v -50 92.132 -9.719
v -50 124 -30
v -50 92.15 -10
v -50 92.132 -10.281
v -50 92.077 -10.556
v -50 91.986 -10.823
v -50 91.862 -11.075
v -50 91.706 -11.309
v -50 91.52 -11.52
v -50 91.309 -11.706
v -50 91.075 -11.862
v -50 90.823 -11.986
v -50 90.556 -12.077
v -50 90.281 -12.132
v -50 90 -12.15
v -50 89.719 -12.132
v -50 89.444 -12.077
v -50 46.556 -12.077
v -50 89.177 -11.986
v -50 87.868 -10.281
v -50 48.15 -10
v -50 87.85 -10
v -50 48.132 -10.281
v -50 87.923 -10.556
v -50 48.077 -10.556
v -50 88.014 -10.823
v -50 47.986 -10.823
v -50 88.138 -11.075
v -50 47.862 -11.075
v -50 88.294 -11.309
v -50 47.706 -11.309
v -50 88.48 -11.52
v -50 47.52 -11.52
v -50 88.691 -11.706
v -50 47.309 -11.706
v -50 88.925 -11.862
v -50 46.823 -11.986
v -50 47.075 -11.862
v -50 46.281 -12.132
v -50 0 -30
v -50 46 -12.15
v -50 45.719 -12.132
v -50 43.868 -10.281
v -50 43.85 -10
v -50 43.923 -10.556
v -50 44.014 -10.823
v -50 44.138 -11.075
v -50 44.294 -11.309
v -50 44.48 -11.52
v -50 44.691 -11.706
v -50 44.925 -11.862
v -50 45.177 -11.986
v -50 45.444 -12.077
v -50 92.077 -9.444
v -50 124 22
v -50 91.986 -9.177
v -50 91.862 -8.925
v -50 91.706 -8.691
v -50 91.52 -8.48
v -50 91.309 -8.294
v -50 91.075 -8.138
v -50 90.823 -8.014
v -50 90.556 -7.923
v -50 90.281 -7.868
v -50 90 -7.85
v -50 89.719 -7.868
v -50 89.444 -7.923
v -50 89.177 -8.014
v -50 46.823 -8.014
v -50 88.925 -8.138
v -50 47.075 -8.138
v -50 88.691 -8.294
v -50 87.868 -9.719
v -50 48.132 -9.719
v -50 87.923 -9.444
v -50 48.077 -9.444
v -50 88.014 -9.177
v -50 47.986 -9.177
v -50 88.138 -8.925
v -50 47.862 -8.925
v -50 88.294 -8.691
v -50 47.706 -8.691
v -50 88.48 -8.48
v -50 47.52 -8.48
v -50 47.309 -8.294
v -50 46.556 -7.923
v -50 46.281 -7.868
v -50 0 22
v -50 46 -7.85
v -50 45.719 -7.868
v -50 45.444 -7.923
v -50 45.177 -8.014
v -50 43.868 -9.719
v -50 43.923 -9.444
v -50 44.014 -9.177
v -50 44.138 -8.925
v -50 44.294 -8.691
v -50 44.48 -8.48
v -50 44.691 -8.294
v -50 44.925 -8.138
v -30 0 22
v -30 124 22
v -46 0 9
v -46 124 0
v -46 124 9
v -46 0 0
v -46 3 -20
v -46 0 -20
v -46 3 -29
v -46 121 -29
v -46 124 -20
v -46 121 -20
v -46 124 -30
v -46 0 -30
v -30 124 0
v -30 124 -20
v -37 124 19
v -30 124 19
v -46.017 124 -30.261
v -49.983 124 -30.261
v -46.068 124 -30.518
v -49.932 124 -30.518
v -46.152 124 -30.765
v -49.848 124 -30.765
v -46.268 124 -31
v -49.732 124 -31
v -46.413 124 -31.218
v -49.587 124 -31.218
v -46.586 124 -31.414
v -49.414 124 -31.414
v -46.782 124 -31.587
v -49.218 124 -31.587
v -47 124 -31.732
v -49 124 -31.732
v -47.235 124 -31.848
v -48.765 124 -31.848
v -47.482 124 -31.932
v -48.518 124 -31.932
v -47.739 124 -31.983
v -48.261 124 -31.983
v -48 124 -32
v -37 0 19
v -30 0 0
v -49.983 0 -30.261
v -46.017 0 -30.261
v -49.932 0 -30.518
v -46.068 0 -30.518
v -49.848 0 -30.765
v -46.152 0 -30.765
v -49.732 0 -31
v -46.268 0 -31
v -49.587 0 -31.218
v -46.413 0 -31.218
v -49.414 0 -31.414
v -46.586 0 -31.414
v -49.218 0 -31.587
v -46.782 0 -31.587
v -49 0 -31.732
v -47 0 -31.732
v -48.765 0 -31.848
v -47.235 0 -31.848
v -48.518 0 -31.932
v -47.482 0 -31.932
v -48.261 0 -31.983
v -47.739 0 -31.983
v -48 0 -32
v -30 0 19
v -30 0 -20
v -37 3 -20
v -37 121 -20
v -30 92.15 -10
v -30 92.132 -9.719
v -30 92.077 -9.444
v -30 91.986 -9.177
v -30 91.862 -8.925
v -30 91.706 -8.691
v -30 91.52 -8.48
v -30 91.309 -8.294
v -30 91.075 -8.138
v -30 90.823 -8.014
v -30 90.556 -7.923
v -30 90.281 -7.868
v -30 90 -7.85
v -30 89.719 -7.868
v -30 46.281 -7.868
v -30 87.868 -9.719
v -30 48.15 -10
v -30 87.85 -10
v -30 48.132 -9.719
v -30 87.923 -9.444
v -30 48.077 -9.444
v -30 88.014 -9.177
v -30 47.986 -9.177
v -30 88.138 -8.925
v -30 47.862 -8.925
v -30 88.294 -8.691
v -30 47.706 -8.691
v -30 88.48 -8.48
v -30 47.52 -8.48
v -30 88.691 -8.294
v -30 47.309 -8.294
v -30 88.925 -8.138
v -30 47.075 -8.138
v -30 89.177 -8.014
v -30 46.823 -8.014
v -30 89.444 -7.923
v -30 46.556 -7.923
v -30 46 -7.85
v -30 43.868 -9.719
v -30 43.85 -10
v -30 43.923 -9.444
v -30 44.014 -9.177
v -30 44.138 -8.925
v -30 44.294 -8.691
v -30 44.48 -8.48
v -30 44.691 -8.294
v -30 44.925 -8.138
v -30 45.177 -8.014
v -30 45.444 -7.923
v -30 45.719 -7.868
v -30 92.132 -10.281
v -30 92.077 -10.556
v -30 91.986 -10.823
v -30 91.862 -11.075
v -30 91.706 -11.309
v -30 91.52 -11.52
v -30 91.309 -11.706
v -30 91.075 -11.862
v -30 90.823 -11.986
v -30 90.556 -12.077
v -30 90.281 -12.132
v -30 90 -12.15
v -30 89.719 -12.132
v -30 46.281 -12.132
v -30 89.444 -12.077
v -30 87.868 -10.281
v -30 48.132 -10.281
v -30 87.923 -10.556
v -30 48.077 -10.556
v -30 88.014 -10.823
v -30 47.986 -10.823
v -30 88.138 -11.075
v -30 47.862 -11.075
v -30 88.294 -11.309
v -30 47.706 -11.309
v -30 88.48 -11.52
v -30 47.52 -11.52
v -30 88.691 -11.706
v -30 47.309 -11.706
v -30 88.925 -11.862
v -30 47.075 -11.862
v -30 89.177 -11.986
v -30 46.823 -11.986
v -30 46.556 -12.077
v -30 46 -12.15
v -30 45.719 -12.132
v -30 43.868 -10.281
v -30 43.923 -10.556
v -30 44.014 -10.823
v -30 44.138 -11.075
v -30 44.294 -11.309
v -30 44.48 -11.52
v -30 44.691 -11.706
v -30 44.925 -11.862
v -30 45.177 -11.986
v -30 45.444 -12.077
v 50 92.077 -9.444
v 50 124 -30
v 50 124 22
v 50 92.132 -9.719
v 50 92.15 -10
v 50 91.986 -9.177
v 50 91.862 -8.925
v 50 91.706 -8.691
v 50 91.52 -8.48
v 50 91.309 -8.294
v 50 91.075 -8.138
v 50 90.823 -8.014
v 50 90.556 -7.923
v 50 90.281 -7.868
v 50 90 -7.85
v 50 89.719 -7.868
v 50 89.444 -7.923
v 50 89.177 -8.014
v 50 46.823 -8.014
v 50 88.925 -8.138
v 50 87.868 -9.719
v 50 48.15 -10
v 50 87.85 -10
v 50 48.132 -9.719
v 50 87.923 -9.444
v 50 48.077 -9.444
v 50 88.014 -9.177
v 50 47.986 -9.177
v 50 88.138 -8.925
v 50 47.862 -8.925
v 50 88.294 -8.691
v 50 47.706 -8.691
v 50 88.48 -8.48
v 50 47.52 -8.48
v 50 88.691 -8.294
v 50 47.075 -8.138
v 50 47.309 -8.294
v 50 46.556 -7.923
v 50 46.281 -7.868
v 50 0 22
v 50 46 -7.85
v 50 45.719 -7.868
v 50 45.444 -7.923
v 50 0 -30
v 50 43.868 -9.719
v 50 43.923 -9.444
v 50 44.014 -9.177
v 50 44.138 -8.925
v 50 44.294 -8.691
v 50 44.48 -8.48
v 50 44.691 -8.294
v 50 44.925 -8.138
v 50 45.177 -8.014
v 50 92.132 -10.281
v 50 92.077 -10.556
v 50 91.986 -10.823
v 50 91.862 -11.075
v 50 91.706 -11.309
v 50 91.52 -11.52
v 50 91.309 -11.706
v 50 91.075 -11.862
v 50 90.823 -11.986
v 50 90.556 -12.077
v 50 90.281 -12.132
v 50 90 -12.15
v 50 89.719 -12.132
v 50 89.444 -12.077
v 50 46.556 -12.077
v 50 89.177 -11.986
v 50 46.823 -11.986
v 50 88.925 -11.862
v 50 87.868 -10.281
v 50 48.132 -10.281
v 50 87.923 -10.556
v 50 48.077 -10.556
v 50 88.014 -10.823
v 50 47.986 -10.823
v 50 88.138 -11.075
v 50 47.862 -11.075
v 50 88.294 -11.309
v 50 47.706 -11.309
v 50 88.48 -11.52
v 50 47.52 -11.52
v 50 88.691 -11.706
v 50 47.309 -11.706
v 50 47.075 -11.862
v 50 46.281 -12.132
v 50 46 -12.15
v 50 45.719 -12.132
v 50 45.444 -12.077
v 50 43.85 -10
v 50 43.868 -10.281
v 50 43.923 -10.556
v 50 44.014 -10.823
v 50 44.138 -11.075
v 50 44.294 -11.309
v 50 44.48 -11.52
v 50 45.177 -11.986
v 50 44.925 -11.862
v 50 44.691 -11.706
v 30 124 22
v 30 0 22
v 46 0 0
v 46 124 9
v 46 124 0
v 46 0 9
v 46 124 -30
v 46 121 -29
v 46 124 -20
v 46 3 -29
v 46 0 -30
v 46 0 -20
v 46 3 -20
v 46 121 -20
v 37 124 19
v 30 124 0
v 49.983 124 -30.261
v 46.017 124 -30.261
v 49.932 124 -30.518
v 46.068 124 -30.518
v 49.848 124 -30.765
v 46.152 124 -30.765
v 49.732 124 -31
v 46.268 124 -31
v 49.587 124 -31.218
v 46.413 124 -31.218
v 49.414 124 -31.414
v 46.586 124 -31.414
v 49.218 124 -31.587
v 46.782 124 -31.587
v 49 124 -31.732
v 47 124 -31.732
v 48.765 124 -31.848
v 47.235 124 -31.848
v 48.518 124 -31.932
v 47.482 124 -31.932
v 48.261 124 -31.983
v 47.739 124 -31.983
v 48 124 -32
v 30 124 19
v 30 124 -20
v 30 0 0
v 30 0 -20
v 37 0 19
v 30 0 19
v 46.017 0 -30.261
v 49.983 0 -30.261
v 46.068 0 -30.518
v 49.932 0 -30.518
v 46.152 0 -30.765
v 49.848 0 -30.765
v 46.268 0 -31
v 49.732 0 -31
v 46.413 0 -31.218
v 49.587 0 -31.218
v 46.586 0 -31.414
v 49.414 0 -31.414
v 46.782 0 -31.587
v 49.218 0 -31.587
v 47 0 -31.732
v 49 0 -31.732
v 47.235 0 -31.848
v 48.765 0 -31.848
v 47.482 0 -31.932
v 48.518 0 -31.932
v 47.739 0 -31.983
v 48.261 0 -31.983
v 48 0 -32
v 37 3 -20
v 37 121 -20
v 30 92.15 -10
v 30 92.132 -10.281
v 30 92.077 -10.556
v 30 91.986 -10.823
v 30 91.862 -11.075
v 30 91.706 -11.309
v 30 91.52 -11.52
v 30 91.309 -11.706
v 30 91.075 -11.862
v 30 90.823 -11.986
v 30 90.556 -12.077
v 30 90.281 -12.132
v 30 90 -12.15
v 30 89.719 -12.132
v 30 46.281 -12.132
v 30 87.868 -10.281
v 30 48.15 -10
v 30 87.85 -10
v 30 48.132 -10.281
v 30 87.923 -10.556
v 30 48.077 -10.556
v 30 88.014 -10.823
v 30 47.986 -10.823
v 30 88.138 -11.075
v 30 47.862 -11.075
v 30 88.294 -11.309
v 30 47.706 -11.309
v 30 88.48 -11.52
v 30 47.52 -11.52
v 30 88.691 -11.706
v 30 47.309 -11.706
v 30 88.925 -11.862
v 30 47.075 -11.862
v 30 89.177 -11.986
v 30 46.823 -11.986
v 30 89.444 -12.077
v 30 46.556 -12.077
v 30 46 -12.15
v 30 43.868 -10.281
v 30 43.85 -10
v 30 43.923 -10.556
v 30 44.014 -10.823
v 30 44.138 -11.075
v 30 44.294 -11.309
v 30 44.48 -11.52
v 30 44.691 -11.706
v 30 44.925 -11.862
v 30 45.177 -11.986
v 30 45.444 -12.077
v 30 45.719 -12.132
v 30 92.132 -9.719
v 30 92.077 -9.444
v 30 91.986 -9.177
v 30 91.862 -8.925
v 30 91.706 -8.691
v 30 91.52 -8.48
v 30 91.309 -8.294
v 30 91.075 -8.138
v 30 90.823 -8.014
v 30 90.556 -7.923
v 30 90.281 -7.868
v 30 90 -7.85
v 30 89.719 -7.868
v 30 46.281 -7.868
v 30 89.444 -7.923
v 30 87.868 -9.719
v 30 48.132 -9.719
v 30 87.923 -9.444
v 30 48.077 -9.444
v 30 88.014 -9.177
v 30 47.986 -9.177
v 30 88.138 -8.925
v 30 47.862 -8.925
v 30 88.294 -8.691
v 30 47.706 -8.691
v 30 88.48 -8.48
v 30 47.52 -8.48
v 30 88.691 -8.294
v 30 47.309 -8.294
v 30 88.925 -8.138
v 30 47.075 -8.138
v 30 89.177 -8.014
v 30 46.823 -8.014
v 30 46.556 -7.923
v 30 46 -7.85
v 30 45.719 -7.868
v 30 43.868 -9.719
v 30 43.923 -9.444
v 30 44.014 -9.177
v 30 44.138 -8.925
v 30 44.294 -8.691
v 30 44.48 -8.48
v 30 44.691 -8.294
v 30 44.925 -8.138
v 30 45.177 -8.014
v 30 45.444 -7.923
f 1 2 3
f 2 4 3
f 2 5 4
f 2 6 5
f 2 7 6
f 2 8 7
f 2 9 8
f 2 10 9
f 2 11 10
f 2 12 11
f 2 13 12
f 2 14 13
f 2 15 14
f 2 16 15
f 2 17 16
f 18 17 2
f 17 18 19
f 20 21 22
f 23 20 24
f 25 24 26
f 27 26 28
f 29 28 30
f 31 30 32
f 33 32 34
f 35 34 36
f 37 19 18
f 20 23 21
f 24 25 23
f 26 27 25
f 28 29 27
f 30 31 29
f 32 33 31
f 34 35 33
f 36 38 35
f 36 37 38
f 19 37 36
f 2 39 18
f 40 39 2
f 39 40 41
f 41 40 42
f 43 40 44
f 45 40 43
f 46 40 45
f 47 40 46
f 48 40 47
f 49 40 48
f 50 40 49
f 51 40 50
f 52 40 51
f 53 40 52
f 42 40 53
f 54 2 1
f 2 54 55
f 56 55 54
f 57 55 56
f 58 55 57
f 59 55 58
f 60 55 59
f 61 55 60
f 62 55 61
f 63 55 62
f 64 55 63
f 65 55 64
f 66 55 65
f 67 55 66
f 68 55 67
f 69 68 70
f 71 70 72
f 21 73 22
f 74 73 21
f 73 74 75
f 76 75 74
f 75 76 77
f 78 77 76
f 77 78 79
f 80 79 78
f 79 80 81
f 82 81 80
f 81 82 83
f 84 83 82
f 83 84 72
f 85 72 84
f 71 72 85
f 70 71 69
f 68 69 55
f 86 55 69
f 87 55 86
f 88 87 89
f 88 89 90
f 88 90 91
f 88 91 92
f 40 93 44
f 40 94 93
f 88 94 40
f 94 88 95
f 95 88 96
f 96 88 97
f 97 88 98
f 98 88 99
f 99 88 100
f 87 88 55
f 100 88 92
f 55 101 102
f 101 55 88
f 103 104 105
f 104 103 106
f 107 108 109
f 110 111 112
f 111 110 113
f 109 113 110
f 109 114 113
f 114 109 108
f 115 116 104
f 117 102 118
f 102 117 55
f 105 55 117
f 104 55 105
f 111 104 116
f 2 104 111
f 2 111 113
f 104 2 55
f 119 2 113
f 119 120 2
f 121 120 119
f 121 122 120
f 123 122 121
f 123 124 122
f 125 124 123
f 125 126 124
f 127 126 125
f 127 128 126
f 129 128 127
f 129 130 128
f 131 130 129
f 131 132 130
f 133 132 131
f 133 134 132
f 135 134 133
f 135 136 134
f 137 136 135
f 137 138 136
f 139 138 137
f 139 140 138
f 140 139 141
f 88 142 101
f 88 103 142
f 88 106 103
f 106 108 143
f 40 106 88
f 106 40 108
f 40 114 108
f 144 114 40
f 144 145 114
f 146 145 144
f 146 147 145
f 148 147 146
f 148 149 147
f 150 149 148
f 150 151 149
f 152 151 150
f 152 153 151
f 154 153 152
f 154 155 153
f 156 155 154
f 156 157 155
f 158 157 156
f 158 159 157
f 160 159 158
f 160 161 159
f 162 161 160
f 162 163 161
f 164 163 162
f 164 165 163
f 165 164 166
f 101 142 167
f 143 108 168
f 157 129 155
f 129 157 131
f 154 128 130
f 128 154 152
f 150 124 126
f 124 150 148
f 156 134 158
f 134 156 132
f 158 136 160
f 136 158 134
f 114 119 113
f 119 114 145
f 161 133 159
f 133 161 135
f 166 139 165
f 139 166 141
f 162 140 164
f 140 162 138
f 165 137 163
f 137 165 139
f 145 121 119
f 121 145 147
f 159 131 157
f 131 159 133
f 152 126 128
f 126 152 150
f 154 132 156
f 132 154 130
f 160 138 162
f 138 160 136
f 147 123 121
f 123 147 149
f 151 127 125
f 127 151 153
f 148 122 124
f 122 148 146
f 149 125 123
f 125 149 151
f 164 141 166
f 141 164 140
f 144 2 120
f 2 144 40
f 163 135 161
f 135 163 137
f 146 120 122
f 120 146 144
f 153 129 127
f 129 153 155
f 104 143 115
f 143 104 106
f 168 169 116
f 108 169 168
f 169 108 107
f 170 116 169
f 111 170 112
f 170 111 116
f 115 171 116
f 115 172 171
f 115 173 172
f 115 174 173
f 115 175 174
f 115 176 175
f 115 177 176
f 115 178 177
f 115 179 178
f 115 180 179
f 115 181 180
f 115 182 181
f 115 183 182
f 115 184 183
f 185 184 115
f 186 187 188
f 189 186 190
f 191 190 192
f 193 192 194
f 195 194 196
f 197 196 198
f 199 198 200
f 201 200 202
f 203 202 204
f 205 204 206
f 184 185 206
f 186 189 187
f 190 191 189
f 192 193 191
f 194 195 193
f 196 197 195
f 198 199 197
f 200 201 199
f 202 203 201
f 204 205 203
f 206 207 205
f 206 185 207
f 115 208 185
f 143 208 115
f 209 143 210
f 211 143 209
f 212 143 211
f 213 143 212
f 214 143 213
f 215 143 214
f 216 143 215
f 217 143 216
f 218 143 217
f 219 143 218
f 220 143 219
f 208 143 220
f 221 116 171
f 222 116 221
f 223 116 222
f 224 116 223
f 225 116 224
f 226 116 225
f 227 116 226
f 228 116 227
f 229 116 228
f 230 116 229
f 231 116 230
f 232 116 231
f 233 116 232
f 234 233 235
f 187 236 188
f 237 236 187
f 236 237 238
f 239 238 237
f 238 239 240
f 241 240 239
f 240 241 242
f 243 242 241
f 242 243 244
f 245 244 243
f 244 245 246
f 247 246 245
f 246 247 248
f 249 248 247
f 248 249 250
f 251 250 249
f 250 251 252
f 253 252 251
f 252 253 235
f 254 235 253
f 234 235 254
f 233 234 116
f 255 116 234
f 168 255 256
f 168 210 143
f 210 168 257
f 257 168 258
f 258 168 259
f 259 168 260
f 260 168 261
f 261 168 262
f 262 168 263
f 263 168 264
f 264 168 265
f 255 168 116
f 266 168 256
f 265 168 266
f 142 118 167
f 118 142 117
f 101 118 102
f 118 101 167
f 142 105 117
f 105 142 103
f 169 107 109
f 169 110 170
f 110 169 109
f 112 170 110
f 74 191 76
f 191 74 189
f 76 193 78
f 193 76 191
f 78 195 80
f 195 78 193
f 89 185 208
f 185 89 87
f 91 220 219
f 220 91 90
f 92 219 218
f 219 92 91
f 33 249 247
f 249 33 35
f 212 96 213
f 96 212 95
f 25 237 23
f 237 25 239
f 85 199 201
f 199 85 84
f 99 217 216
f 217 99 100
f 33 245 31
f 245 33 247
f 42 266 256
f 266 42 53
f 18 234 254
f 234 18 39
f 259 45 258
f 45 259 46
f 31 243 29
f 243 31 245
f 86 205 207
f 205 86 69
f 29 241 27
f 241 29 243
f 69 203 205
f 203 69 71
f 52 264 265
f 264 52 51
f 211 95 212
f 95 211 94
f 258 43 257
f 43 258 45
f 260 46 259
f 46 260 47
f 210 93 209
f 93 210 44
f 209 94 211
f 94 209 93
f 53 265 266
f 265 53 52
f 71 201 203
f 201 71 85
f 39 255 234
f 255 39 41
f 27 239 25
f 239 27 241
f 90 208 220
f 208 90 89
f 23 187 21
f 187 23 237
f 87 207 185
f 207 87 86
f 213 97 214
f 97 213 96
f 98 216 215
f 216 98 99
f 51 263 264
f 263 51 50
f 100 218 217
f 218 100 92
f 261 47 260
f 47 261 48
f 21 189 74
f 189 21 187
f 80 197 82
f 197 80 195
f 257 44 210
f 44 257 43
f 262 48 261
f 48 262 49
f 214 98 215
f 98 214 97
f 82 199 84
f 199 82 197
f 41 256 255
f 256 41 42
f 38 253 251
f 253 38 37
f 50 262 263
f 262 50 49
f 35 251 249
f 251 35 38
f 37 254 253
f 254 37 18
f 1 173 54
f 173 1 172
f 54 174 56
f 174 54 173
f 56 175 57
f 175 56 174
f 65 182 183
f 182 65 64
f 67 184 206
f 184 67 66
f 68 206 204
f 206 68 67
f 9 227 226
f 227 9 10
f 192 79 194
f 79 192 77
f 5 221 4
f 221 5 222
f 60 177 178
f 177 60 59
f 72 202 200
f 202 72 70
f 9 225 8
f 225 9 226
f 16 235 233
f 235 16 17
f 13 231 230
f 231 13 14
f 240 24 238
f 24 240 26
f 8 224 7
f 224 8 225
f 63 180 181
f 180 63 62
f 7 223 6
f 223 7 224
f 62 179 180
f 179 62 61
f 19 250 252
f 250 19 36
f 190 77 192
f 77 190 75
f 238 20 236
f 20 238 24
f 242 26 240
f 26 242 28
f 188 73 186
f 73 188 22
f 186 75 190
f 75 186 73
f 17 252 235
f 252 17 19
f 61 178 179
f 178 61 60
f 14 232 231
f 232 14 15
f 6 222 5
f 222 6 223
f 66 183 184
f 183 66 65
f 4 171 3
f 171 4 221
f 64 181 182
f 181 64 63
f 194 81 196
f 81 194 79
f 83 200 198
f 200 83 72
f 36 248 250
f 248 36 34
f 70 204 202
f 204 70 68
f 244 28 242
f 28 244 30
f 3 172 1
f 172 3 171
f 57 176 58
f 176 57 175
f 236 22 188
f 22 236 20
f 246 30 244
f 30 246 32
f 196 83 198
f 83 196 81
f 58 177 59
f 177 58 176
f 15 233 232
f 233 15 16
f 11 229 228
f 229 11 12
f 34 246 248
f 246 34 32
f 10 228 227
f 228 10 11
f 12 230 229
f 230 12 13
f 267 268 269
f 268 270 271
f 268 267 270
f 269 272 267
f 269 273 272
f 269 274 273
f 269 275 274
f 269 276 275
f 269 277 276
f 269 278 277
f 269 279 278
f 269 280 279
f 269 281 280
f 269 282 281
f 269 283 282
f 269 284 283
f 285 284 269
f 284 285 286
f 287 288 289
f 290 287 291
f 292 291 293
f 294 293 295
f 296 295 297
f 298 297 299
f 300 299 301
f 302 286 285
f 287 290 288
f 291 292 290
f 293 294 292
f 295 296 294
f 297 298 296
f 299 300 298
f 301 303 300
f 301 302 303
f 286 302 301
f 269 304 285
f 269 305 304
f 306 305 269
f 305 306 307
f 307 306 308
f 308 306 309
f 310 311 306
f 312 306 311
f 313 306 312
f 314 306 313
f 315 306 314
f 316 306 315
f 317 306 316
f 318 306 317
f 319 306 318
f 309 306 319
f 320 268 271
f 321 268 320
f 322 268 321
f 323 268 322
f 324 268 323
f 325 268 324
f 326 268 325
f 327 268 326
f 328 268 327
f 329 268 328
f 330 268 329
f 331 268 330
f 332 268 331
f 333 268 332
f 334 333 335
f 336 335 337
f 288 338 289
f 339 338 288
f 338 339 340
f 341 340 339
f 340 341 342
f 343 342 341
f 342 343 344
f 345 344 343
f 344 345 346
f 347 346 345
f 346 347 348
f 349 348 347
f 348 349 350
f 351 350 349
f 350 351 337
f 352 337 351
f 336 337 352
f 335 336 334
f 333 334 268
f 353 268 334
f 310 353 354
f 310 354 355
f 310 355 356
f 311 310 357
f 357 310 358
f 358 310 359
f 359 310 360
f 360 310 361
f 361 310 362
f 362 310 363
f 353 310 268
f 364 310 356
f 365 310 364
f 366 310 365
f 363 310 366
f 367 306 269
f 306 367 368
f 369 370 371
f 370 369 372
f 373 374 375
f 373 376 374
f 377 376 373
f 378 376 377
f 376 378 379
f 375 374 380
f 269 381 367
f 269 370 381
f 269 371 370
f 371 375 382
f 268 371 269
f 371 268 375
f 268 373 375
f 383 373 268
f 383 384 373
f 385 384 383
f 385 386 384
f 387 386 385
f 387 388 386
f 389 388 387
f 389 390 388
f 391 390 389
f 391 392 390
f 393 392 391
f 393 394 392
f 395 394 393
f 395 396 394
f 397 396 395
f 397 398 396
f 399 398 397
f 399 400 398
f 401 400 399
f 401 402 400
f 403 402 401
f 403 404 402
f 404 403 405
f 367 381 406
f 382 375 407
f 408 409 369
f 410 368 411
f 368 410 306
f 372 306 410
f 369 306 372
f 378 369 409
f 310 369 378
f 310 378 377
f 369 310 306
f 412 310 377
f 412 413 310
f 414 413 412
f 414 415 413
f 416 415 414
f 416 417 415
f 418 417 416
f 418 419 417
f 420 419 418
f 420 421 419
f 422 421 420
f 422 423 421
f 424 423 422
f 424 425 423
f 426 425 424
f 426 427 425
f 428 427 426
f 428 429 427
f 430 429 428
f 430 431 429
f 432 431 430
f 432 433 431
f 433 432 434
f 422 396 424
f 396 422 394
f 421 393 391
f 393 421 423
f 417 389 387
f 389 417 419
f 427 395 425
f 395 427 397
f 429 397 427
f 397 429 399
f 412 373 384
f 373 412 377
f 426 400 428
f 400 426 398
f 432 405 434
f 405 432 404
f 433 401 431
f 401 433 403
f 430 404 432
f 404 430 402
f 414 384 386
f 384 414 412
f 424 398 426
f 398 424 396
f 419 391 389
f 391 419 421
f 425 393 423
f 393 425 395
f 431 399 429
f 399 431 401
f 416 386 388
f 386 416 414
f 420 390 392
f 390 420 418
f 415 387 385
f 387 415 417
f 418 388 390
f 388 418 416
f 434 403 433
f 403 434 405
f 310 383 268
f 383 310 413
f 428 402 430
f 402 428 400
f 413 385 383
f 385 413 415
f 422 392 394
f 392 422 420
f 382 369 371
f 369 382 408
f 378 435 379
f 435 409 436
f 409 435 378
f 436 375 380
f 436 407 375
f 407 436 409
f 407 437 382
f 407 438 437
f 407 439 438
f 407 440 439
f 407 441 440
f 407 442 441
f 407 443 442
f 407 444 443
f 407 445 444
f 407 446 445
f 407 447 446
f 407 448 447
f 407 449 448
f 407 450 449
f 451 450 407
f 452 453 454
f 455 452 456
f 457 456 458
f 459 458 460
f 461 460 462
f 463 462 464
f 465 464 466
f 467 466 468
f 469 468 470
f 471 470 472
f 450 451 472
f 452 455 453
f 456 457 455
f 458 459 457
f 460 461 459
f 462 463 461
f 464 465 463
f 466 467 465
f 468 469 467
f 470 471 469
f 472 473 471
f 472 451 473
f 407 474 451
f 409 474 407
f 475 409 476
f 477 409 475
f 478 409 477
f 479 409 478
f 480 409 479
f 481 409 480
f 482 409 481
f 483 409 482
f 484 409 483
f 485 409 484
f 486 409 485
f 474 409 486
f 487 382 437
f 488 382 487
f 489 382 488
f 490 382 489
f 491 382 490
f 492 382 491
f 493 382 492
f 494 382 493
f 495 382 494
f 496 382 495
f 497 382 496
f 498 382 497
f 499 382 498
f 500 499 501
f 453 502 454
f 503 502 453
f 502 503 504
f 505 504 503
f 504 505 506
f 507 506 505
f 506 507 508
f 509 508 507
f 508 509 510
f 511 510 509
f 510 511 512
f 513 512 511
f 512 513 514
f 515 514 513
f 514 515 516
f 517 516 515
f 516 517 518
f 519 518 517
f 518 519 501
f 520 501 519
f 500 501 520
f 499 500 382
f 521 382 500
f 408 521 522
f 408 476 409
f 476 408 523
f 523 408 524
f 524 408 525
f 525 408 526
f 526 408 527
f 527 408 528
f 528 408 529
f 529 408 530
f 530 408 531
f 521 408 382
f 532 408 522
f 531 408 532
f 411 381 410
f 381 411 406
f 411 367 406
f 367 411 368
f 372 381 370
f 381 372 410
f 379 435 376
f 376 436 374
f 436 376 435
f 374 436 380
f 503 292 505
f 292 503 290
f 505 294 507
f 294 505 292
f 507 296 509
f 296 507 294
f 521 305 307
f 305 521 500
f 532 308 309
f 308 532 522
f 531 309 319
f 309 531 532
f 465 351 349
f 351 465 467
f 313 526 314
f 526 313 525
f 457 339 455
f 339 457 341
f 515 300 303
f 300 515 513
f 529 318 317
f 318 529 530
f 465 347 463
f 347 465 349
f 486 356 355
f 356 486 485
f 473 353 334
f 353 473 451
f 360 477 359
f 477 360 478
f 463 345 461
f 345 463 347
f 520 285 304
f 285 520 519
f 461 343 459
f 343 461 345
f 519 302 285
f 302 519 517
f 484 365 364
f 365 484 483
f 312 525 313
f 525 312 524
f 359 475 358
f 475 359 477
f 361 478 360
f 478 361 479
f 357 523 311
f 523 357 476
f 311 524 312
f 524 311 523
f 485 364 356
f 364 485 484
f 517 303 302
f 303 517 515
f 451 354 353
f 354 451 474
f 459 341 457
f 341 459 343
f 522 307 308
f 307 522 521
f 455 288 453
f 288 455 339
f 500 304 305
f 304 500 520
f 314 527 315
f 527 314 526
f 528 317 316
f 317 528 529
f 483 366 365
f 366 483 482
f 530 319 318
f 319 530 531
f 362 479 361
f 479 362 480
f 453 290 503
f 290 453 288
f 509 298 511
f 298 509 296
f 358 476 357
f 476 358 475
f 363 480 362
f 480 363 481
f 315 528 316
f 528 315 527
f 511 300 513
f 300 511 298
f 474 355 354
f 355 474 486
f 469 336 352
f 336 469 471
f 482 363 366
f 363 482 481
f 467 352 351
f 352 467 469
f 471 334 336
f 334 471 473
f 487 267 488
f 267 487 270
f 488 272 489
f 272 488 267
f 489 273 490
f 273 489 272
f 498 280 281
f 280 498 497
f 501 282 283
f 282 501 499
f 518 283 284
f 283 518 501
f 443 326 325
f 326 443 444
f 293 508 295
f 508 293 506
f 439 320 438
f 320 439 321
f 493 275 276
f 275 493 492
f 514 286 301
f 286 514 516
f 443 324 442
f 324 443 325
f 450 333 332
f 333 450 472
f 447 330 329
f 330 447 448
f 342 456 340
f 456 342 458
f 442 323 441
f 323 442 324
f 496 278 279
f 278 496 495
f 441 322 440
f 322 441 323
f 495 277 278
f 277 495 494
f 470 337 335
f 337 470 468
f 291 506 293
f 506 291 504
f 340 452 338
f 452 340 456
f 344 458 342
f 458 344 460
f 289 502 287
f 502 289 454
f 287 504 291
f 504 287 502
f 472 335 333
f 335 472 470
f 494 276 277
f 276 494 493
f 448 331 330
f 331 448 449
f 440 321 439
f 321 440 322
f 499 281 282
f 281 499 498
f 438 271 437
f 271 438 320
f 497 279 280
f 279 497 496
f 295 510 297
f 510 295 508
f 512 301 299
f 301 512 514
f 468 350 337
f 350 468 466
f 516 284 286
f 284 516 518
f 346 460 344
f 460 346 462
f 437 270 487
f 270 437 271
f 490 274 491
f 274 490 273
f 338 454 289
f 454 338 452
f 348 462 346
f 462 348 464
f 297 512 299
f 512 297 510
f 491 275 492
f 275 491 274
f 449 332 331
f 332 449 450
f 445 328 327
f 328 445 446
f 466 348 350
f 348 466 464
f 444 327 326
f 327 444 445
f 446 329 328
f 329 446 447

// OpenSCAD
// ============================================================================
// Top side handles
//
// One unique printable corner handle is used twice. The left instance is a
// mirrored copy of the right-hand model.
//
// Local coordinates:
// - X: outward from the wooden side panel
// - Y: from front to rear
// - Z: relative to the underside of the top wooden panel
// ============================================================================

/* [Component view] */

component_selection = "assembled"; // [assembled,exploded,all_unique,component_1]
component_orientation = "model"; // [model,print]

/* [Geometry quality] */

curve_segments = 48;
$fn = curve_segments;

module rounded_outer_wall(
    thickness=4,
    depth=124,
    height=54,
    lower_band_height=12,
    lower_band_overlap=4,
    lower_corner_radius=2
) {
    band_h = min(lower_band_height,height);
    overlap = min(lower_band_overlap,band_h);
    radius = min(lower_corner_radius,thickness/2,band_h/2);

    union() {
        translate([0,0,band_h-overlap])
            cube([thickness,depth,height-(band_h-overlap)]);

        hull()
            for(x=[radius,thickness-radius])
                for(z=[radius,band_h-radius])
                    translate([x,0,z])
                        rotate([-90,0,0])
                            cylinder(h=depth,r=radius);
    }
}

module triangular_prism_y(p0,p1,p2,y0,depth) {
    polyhedron(
        points=[
            [p0[0],y0,p0[1]],
            [p1[0],y0,p1[1]],
            [p2[0],y0,p2[1]],
            [p0[0],y0+depth,p0[1]],
            [p1[0],y0+depth,p1[1]],
            [p2[0],y0+depth,p2[1]]
        ],
        faces=[
            [0,2,1],
            [3,4,5],
            [0,1,4,3],
            [1,2,5,4],
            [2,0,3,5]
        ],
        convexity=10
    );
}

// Canonical right-hand handle. Mirror in X for the left-hand instance.
module top_side_handle(
    overhang_width=16,
    depth=124,
    wood_thickness=19,
    support_height=20,
    outer_wall_thickness=4,
    lower_grip_extension=12,
    top_lip_thickness=3,
    lower_band_height=12,
    lower_band_overlap=4,
    lower_corner_radius=2,
    upper_transition_start=9,
    upper_transition_size=9,
    lower_rib_size=9,
    bolt_hole_diameter=4.3,
    bolt_y=[46,90],
    show_mounting_holes=true
) {
    support_z0 = -support_height;
    wall_z0 = support_z0-lower_grip_extension;
    wall_height =
        lower_grip_extension
        +support_height
        +wood_thickness
        +top_lip_thickness;

    assert(overhang_width > 0,"overhang_width must be positive.");
    assert(depth > 6,"depth must be greater than 6 mm.");
    assert(len(bolt_y) == 2,"Two mounting-hole Y positions are required.");

    color([0.18,0.72,0.24,1])
    difference() {
        union() {
            // Horizontal support beneath the top-panel overhang.
            translate([0,0,support_z0])
                cube([overhang_width,depth,support_height]);

            // Outer vertical wall with rounded lower grip edge.
            translate([overhang_width,0,wall_z0])
                rounded_outer_wall(
                    outer_wall_thickness,
                    depth,
                    wall_height,
                    lower_band_height,
                    lower_band_overlap,
                    lower_corner_radius
                );

            // Short lip over the outer end of the wooden top panel.
            translate([0,0,wood_thickness])
                cube([overhang_width,depth,top_lip_thickness]);

            // Upper 45-degree transition.
            triangular_prism_y(
                [overhang_width,upper_transition_start],
                [overhang_width,wood_thickness],
                [overhang_width-upper_transition_size,wood_thickness],
                0,
                depth
            );

            // Lower internal strengthening rib.
            triangular_prism_y(
                [overhang_width,support_z0],
                [overhang_width-lower_rib_size,support_z0],
                [overhang_width,support_z0-lower_rib_size],
                3,
                depth-6
            );
        }

        if(show_mounting_holes)
            for(ypos=bolt_y)
                translate([
                    overhang_width+outer_wall_thickness+0.2,
                    ypos,
                    -support_height/2
                ])
                    rotate([0,-90,0])
                        cylinder(
                            d=bolt_hole_diameter,
                            h=overhang_width+outer_wall_thickness+2
                        );
    }
}

module top_side_handle_oriented(
    side="right",
    orientation="model",
    show_mounting_holes=true
) {
    module selected_side() {
        if(side=="right")
            top_side_handle(show_mounting_holes=show_mounting_holes);
        else if(side=="left")
            mirror([1,0,0])
                top_side_handle(show_mounting_holes=show_mounting_holes);
        else
            assert(false,"side must be left or right.");
    }

    if(orientation=="model")
        selected_side();
    else if(orientation=="print")
        rotate([0,90,0]) selected_side();
    else
        assert(false,"orientation must be model or print.");
}

module top_handles_view(
    selection="assembled",
    orientation="model",
    show_mounting_holes=true
) {
    spacing = selection=="exploded" ? 70 : 30;

    if(selection=="assembled" || selection=="exploded") {
        translate([-spacing,0,0])
            top_side_handle_oriented(
                "left",orientation,show_mounting_holes
            );
        translate([spacing,0,0])
            top_side_handle_oriented(
                "right",orientation,show_mounting_holes
            );
    } else if(selection=="all_unique" || selection=="component_1") {
        top_side_handle_oriented(
            "right",orientation,show_mounting_holes
        );
    } else {
        assert(false,str("Unknown component_selection: ",selection));
    }
}

top_handles_view(component_selection,component_orientation,true);
